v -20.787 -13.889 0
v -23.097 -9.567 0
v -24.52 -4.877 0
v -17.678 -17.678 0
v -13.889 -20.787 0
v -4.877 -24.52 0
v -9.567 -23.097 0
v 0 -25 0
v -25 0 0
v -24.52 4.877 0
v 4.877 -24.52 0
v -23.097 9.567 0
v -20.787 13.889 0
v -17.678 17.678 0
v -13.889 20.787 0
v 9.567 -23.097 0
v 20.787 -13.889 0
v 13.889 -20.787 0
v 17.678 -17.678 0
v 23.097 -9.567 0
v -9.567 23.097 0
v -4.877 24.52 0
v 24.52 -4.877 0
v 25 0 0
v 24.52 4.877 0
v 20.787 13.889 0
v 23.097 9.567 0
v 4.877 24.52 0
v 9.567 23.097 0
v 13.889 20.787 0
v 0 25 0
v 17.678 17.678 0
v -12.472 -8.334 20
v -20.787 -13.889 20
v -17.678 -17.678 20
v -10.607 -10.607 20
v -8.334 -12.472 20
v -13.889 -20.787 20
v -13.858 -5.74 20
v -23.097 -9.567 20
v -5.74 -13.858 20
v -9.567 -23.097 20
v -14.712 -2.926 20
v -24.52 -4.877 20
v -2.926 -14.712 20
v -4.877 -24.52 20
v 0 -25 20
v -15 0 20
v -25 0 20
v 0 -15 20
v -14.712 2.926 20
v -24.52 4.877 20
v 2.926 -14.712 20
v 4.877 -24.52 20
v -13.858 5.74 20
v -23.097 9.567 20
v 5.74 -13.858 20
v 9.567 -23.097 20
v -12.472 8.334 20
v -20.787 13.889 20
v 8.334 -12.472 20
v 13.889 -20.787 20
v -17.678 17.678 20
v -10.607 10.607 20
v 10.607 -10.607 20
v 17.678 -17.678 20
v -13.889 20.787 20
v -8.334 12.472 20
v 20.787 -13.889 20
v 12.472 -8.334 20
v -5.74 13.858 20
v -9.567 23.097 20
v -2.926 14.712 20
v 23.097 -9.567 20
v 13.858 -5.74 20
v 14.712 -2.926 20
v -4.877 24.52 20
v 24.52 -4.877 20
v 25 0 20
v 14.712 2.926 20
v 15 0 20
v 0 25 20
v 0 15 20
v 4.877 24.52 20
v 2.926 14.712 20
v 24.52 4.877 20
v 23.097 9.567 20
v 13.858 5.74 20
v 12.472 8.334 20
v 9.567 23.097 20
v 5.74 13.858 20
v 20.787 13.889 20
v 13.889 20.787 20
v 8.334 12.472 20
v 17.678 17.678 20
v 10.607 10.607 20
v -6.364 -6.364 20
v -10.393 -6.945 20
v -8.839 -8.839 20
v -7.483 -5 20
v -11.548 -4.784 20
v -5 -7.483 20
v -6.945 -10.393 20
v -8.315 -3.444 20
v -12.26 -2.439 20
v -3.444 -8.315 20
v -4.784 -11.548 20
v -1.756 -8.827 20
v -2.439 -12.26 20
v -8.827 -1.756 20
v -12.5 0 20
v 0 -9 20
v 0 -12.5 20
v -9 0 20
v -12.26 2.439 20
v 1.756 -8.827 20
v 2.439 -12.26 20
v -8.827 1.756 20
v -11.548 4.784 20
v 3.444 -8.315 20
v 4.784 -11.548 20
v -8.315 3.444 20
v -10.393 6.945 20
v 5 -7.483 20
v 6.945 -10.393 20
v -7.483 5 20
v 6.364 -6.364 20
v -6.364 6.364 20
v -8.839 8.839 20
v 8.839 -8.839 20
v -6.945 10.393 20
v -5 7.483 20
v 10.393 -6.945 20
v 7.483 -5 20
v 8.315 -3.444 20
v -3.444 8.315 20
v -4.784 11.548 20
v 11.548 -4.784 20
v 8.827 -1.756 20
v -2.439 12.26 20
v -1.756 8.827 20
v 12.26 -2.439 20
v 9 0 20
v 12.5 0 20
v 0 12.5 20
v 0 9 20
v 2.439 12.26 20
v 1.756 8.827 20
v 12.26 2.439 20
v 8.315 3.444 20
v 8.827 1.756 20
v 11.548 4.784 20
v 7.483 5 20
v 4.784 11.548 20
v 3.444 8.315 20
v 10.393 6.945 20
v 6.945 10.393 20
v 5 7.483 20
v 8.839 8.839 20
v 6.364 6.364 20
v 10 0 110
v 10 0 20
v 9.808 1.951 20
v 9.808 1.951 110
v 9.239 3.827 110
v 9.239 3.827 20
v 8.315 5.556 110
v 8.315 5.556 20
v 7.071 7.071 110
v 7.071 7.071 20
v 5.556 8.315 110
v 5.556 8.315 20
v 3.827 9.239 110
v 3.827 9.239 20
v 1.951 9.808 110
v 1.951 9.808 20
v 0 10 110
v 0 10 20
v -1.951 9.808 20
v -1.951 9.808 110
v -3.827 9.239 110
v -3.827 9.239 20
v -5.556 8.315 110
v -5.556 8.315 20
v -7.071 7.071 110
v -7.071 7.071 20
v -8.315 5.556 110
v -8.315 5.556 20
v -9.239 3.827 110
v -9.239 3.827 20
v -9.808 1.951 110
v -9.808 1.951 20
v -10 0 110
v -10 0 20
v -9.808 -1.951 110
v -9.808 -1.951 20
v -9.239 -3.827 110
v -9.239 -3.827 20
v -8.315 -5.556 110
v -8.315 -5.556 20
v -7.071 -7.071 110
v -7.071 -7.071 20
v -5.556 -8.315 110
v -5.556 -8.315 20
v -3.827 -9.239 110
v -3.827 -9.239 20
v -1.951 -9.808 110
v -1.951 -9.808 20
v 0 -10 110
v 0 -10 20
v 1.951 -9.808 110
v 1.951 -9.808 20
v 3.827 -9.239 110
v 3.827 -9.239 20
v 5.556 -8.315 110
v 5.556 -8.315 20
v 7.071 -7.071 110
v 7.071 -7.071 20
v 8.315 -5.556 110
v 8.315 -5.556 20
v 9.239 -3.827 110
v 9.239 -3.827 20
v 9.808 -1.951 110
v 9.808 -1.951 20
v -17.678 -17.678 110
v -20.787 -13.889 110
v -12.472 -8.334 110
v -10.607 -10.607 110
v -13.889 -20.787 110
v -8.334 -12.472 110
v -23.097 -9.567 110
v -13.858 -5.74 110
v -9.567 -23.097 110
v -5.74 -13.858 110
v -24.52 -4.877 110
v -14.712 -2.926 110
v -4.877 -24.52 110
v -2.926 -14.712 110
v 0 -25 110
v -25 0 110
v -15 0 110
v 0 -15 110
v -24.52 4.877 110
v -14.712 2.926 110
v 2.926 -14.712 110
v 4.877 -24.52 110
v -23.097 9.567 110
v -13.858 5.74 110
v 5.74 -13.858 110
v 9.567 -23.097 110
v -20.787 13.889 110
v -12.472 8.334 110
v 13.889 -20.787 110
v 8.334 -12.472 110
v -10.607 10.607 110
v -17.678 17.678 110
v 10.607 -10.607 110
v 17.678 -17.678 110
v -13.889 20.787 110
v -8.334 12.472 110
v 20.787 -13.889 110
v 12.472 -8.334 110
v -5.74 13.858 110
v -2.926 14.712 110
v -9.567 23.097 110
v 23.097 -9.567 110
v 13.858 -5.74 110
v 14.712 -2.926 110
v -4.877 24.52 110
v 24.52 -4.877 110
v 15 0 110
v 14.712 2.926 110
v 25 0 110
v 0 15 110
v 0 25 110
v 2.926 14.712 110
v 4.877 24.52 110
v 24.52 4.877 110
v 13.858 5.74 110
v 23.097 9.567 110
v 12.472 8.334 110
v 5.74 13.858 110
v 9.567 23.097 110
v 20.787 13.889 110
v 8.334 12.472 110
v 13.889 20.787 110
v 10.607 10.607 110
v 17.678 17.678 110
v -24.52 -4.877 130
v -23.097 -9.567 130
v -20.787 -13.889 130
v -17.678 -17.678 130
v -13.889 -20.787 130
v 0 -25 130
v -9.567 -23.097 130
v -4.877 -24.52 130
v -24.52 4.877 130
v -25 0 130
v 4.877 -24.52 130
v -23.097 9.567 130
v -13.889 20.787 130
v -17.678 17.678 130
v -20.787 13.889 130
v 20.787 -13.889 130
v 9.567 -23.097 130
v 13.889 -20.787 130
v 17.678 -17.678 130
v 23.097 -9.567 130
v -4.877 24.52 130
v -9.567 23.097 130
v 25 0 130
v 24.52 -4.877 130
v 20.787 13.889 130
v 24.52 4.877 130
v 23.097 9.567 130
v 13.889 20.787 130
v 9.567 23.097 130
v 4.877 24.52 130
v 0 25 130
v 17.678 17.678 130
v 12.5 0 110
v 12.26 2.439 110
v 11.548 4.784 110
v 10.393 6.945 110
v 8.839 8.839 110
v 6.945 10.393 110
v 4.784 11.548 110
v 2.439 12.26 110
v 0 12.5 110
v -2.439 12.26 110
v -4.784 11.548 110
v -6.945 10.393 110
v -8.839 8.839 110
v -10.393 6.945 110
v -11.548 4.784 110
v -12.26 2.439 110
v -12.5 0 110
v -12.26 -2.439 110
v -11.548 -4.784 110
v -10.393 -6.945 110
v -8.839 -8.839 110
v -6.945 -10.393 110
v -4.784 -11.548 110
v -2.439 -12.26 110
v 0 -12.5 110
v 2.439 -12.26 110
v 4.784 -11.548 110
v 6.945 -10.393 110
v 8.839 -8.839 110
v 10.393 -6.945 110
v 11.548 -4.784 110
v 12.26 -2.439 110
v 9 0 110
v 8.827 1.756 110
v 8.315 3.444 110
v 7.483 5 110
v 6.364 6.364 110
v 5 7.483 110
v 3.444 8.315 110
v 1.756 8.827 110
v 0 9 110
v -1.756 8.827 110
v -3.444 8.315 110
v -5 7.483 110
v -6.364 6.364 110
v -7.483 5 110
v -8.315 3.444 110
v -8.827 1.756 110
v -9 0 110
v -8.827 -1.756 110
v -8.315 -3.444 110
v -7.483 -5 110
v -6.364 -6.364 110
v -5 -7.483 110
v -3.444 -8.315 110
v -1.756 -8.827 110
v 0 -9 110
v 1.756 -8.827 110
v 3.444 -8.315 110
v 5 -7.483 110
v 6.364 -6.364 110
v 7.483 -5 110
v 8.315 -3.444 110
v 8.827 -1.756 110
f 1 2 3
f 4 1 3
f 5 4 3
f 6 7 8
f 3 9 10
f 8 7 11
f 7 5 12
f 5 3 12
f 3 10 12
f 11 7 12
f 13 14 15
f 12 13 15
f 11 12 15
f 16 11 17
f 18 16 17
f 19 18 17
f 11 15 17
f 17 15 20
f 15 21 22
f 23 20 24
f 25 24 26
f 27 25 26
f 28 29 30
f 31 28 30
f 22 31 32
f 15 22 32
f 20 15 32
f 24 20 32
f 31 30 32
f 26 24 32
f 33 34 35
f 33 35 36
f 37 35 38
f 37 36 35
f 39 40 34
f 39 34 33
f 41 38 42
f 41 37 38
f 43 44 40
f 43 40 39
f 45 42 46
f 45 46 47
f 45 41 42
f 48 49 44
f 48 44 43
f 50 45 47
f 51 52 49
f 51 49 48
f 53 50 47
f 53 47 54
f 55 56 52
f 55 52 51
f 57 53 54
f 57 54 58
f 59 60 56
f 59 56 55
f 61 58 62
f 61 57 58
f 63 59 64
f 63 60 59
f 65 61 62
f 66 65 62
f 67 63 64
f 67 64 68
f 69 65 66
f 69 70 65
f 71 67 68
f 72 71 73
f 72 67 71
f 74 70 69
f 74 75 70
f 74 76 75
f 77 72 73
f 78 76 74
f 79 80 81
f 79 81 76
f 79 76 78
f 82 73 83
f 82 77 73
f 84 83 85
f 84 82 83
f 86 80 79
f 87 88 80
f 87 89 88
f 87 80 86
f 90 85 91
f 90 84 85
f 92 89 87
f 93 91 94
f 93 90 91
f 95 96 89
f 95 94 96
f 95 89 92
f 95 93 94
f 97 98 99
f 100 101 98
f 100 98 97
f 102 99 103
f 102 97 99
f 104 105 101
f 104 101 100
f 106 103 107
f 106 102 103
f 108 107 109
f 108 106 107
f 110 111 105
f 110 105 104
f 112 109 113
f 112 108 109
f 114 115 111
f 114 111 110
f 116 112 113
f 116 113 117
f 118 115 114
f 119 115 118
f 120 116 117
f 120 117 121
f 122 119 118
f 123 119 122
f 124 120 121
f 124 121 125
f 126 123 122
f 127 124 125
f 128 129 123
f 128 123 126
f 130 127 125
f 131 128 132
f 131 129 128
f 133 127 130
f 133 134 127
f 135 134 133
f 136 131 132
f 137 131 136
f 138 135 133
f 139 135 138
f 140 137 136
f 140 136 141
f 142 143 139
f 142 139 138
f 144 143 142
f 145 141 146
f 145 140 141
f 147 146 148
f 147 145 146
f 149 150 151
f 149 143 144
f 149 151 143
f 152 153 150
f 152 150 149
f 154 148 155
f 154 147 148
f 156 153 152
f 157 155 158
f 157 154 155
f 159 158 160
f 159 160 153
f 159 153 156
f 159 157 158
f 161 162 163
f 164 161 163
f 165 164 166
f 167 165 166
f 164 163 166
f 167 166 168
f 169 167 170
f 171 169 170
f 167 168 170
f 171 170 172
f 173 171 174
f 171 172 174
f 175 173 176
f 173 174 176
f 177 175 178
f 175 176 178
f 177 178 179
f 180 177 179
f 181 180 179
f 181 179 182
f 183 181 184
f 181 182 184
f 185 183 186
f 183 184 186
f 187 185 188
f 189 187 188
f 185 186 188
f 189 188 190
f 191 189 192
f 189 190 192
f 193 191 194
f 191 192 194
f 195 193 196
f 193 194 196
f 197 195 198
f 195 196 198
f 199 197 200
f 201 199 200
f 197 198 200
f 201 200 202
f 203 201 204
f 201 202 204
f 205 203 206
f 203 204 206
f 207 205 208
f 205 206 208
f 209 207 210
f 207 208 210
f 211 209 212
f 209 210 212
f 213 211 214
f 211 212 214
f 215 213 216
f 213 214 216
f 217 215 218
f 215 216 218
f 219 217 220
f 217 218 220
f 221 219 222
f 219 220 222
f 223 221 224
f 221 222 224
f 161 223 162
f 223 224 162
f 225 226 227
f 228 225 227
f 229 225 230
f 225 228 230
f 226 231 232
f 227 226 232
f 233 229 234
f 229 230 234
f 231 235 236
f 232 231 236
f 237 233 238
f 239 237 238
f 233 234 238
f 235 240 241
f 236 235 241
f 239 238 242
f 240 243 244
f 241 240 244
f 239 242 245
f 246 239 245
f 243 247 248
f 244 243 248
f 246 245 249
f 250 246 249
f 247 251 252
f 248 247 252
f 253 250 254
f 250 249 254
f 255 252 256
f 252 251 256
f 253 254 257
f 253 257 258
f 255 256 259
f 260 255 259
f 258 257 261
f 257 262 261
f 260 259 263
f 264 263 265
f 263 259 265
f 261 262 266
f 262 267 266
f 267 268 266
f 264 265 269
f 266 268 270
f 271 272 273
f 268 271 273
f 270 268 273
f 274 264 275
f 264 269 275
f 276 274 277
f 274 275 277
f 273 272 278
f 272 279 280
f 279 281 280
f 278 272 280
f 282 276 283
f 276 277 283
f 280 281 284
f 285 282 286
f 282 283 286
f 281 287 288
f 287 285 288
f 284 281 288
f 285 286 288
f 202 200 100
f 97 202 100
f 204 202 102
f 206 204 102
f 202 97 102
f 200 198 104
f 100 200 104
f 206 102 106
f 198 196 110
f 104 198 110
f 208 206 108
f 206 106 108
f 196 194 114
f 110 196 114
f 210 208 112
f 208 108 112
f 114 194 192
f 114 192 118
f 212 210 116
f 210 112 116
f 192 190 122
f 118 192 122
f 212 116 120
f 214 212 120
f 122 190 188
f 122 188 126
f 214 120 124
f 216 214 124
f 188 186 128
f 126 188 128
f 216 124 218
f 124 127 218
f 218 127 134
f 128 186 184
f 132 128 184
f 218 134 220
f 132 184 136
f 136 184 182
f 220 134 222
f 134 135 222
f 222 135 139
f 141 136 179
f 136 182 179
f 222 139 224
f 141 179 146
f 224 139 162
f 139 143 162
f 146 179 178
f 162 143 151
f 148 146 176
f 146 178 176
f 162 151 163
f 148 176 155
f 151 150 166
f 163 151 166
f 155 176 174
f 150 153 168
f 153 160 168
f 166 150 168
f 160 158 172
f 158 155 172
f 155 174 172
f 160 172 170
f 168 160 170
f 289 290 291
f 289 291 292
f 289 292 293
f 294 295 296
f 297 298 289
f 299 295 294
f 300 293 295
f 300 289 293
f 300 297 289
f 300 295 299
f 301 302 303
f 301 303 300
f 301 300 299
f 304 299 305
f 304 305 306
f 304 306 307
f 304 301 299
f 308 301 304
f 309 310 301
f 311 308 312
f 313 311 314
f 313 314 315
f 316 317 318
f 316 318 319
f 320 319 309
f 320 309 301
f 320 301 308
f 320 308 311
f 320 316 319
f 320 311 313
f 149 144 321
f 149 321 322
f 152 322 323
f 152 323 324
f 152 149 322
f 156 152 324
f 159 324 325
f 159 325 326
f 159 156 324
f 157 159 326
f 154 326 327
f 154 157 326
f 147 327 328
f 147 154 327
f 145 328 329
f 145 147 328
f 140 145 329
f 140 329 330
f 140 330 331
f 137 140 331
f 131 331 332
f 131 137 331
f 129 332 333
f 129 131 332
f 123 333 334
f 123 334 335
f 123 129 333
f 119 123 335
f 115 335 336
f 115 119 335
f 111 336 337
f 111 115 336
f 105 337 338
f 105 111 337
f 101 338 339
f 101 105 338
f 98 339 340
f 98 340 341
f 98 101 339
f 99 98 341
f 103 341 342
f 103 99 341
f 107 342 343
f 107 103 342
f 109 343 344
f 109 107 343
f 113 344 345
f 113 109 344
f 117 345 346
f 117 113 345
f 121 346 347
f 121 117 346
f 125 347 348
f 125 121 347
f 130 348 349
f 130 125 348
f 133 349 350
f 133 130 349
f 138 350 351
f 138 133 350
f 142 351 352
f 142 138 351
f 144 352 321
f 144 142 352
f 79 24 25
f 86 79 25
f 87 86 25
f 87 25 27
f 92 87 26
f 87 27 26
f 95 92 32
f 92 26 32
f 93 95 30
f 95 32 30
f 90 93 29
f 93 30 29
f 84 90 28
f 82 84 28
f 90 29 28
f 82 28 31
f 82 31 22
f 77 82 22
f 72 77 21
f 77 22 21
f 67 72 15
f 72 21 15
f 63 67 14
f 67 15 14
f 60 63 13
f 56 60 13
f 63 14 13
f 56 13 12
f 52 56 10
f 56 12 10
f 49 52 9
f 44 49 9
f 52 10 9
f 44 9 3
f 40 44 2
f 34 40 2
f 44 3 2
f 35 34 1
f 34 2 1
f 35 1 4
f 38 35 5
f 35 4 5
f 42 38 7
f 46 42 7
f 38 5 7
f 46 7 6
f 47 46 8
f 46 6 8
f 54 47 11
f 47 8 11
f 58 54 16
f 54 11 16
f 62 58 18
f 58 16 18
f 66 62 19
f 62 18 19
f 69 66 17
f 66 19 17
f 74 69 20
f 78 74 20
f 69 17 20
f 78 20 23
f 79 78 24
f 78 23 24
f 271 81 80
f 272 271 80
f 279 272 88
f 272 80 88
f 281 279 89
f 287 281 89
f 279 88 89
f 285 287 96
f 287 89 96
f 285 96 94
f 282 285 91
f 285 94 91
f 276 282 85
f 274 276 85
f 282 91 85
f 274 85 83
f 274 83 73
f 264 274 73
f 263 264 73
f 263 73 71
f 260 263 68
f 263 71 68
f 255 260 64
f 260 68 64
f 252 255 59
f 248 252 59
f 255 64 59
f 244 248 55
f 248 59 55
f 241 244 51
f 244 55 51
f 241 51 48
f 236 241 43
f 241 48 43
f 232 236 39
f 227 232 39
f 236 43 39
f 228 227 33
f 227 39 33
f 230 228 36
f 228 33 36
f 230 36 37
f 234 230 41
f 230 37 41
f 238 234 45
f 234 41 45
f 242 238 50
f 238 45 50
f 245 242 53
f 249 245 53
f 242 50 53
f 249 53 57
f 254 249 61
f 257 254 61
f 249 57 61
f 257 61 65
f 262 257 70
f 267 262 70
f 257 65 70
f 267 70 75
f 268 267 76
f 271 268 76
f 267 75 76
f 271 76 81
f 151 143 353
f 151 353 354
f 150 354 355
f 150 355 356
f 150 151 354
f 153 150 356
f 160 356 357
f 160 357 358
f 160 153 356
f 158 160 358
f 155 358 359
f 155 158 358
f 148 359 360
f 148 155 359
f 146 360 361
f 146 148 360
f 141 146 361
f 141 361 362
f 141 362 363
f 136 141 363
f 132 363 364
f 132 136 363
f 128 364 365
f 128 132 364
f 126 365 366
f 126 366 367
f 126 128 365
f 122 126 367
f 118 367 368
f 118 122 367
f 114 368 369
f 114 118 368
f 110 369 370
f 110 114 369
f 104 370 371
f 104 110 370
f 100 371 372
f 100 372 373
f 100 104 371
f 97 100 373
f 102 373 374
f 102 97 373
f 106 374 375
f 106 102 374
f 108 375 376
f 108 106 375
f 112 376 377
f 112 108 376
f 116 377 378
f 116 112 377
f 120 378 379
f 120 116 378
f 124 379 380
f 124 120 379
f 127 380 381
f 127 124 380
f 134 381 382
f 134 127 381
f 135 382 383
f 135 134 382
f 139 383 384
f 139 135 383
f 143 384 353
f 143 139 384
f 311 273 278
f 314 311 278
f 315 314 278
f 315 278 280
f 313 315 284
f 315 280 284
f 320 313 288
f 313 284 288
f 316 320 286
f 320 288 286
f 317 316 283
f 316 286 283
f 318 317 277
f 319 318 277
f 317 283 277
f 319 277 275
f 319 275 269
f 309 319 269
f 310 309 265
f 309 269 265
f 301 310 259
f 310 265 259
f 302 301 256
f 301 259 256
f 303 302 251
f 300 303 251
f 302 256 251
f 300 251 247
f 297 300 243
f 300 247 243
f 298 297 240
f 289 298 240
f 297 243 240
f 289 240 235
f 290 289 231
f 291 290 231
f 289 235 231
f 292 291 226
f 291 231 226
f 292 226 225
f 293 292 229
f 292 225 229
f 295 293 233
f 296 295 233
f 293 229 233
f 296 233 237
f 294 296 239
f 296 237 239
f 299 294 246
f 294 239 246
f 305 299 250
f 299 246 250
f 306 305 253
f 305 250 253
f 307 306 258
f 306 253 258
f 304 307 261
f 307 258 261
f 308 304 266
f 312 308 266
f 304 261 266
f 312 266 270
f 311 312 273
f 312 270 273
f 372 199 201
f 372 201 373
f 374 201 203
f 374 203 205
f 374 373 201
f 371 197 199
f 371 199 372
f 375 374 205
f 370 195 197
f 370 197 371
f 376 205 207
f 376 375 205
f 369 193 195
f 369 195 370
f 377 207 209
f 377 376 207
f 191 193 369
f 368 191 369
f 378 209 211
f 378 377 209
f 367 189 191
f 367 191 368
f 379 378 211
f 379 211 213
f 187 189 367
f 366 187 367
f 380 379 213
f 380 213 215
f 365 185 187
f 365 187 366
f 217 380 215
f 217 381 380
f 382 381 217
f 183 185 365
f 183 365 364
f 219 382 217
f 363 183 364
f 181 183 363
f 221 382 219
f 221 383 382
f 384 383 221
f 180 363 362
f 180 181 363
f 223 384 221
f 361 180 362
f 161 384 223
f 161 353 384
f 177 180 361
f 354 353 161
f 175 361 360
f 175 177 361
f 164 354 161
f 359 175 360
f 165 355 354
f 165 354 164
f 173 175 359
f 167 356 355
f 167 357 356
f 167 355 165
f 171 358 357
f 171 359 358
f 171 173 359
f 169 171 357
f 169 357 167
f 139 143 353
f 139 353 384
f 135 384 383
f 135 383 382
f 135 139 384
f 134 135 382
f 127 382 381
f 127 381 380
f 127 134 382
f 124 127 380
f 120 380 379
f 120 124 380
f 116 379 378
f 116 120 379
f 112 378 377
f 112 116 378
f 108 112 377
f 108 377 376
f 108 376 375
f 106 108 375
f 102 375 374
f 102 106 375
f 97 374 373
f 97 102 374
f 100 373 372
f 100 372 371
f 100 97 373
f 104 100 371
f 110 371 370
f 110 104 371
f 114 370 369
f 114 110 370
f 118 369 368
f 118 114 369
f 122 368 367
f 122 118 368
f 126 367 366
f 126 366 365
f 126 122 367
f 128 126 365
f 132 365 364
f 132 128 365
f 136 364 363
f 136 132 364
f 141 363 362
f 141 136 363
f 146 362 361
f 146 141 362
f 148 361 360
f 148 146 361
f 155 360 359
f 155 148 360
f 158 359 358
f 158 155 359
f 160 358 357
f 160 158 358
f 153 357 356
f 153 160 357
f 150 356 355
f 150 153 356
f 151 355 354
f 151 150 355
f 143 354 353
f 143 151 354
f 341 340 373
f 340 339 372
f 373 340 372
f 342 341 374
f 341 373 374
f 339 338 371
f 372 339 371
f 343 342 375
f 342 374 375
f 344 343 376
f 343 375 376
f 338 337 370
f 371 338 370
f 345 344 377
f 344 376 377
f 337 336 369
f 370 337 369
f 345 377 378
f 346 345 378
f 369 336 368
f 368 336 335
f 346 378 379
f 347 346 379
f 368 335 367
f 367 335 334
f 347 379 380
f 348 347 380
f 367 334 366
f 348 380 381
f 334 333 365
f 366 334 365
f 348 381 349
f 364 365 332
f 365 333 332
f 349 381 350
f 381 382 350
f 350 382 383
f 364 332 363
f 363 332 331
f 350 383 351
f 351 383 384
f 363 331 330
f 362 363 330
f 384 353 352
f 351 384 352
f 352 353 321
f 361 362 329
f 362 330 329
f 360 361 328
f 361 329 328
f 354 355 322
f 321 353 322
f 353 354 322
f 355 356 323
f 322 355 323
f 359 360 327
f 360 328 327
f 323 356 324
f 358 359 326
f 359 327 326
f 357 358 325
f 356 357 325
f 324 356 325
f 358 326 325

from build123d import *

# Parameters (mm, degrees)
F0_R      = 25
F1_DEPTH  = 20
F2_R      = 15
F3_DEPTH  = 90
F4_R      = 25
F5_DEPTH  = 20
F6_R      = 12.5
F7_DEPTH  = 90
F8_R      = 10
F9_DEPTH  = 90
F10_R     = 9
F11_DEPTH = 90
F12_R     = 9
F13_DEPTH = 90


with BuildPart() as f1:
    # F0 (on Top) → F1 (new body)
    with BuildSketch(Plane.XY):
        Circle(F0_R)
    extrude(amount=F1_DEPTH)

    # F2 (on face) → F3 (join)
    with BuildSketch(Plane.XY.offset(20)):
        Circle(F2_R)
    extrude(amount=F3_DEPTH)

    # F4 (on face) → F5 (join)
    with BuildSketch(Plane.XY.offset(110)):
        Circle(F4_R)
    extrude(amount=F5_DEPTH)

    # F6 (on face) → F7 (cut)
    with BuildSketch(Plane.XY.offset(20)):
        Circle(F6_R)
    extrude(amount=F7_DEPTH, mode=Mode.SUBTRACT)

    # F12 (on face) → F13 (join)
    with BuildSketch(Plane(origin=(0, 0, 20), x_dir=(1, 0, 0), z_dir=(0, 0, -1))):
        Circle(F12_R)
    extrude(amount=-F13_DEPTH)


with BuildPart() as f9:
    # F8 (on face) → F9 (new body)
    with BuildSketch(Plane.XY.offset(20)):
        Circle(F8_R)
    extrude(amount=F9_DEPTH)

    # F10 (on face) → F11 (cut)
    with BuildSketch(Plane.XY.offset(20)):
        Circle(F10_R)
    extrude(amount=F11_DEPTH, mode=Mode.SUBTRACT)


solid = Compound([f1.part, f9.part])
